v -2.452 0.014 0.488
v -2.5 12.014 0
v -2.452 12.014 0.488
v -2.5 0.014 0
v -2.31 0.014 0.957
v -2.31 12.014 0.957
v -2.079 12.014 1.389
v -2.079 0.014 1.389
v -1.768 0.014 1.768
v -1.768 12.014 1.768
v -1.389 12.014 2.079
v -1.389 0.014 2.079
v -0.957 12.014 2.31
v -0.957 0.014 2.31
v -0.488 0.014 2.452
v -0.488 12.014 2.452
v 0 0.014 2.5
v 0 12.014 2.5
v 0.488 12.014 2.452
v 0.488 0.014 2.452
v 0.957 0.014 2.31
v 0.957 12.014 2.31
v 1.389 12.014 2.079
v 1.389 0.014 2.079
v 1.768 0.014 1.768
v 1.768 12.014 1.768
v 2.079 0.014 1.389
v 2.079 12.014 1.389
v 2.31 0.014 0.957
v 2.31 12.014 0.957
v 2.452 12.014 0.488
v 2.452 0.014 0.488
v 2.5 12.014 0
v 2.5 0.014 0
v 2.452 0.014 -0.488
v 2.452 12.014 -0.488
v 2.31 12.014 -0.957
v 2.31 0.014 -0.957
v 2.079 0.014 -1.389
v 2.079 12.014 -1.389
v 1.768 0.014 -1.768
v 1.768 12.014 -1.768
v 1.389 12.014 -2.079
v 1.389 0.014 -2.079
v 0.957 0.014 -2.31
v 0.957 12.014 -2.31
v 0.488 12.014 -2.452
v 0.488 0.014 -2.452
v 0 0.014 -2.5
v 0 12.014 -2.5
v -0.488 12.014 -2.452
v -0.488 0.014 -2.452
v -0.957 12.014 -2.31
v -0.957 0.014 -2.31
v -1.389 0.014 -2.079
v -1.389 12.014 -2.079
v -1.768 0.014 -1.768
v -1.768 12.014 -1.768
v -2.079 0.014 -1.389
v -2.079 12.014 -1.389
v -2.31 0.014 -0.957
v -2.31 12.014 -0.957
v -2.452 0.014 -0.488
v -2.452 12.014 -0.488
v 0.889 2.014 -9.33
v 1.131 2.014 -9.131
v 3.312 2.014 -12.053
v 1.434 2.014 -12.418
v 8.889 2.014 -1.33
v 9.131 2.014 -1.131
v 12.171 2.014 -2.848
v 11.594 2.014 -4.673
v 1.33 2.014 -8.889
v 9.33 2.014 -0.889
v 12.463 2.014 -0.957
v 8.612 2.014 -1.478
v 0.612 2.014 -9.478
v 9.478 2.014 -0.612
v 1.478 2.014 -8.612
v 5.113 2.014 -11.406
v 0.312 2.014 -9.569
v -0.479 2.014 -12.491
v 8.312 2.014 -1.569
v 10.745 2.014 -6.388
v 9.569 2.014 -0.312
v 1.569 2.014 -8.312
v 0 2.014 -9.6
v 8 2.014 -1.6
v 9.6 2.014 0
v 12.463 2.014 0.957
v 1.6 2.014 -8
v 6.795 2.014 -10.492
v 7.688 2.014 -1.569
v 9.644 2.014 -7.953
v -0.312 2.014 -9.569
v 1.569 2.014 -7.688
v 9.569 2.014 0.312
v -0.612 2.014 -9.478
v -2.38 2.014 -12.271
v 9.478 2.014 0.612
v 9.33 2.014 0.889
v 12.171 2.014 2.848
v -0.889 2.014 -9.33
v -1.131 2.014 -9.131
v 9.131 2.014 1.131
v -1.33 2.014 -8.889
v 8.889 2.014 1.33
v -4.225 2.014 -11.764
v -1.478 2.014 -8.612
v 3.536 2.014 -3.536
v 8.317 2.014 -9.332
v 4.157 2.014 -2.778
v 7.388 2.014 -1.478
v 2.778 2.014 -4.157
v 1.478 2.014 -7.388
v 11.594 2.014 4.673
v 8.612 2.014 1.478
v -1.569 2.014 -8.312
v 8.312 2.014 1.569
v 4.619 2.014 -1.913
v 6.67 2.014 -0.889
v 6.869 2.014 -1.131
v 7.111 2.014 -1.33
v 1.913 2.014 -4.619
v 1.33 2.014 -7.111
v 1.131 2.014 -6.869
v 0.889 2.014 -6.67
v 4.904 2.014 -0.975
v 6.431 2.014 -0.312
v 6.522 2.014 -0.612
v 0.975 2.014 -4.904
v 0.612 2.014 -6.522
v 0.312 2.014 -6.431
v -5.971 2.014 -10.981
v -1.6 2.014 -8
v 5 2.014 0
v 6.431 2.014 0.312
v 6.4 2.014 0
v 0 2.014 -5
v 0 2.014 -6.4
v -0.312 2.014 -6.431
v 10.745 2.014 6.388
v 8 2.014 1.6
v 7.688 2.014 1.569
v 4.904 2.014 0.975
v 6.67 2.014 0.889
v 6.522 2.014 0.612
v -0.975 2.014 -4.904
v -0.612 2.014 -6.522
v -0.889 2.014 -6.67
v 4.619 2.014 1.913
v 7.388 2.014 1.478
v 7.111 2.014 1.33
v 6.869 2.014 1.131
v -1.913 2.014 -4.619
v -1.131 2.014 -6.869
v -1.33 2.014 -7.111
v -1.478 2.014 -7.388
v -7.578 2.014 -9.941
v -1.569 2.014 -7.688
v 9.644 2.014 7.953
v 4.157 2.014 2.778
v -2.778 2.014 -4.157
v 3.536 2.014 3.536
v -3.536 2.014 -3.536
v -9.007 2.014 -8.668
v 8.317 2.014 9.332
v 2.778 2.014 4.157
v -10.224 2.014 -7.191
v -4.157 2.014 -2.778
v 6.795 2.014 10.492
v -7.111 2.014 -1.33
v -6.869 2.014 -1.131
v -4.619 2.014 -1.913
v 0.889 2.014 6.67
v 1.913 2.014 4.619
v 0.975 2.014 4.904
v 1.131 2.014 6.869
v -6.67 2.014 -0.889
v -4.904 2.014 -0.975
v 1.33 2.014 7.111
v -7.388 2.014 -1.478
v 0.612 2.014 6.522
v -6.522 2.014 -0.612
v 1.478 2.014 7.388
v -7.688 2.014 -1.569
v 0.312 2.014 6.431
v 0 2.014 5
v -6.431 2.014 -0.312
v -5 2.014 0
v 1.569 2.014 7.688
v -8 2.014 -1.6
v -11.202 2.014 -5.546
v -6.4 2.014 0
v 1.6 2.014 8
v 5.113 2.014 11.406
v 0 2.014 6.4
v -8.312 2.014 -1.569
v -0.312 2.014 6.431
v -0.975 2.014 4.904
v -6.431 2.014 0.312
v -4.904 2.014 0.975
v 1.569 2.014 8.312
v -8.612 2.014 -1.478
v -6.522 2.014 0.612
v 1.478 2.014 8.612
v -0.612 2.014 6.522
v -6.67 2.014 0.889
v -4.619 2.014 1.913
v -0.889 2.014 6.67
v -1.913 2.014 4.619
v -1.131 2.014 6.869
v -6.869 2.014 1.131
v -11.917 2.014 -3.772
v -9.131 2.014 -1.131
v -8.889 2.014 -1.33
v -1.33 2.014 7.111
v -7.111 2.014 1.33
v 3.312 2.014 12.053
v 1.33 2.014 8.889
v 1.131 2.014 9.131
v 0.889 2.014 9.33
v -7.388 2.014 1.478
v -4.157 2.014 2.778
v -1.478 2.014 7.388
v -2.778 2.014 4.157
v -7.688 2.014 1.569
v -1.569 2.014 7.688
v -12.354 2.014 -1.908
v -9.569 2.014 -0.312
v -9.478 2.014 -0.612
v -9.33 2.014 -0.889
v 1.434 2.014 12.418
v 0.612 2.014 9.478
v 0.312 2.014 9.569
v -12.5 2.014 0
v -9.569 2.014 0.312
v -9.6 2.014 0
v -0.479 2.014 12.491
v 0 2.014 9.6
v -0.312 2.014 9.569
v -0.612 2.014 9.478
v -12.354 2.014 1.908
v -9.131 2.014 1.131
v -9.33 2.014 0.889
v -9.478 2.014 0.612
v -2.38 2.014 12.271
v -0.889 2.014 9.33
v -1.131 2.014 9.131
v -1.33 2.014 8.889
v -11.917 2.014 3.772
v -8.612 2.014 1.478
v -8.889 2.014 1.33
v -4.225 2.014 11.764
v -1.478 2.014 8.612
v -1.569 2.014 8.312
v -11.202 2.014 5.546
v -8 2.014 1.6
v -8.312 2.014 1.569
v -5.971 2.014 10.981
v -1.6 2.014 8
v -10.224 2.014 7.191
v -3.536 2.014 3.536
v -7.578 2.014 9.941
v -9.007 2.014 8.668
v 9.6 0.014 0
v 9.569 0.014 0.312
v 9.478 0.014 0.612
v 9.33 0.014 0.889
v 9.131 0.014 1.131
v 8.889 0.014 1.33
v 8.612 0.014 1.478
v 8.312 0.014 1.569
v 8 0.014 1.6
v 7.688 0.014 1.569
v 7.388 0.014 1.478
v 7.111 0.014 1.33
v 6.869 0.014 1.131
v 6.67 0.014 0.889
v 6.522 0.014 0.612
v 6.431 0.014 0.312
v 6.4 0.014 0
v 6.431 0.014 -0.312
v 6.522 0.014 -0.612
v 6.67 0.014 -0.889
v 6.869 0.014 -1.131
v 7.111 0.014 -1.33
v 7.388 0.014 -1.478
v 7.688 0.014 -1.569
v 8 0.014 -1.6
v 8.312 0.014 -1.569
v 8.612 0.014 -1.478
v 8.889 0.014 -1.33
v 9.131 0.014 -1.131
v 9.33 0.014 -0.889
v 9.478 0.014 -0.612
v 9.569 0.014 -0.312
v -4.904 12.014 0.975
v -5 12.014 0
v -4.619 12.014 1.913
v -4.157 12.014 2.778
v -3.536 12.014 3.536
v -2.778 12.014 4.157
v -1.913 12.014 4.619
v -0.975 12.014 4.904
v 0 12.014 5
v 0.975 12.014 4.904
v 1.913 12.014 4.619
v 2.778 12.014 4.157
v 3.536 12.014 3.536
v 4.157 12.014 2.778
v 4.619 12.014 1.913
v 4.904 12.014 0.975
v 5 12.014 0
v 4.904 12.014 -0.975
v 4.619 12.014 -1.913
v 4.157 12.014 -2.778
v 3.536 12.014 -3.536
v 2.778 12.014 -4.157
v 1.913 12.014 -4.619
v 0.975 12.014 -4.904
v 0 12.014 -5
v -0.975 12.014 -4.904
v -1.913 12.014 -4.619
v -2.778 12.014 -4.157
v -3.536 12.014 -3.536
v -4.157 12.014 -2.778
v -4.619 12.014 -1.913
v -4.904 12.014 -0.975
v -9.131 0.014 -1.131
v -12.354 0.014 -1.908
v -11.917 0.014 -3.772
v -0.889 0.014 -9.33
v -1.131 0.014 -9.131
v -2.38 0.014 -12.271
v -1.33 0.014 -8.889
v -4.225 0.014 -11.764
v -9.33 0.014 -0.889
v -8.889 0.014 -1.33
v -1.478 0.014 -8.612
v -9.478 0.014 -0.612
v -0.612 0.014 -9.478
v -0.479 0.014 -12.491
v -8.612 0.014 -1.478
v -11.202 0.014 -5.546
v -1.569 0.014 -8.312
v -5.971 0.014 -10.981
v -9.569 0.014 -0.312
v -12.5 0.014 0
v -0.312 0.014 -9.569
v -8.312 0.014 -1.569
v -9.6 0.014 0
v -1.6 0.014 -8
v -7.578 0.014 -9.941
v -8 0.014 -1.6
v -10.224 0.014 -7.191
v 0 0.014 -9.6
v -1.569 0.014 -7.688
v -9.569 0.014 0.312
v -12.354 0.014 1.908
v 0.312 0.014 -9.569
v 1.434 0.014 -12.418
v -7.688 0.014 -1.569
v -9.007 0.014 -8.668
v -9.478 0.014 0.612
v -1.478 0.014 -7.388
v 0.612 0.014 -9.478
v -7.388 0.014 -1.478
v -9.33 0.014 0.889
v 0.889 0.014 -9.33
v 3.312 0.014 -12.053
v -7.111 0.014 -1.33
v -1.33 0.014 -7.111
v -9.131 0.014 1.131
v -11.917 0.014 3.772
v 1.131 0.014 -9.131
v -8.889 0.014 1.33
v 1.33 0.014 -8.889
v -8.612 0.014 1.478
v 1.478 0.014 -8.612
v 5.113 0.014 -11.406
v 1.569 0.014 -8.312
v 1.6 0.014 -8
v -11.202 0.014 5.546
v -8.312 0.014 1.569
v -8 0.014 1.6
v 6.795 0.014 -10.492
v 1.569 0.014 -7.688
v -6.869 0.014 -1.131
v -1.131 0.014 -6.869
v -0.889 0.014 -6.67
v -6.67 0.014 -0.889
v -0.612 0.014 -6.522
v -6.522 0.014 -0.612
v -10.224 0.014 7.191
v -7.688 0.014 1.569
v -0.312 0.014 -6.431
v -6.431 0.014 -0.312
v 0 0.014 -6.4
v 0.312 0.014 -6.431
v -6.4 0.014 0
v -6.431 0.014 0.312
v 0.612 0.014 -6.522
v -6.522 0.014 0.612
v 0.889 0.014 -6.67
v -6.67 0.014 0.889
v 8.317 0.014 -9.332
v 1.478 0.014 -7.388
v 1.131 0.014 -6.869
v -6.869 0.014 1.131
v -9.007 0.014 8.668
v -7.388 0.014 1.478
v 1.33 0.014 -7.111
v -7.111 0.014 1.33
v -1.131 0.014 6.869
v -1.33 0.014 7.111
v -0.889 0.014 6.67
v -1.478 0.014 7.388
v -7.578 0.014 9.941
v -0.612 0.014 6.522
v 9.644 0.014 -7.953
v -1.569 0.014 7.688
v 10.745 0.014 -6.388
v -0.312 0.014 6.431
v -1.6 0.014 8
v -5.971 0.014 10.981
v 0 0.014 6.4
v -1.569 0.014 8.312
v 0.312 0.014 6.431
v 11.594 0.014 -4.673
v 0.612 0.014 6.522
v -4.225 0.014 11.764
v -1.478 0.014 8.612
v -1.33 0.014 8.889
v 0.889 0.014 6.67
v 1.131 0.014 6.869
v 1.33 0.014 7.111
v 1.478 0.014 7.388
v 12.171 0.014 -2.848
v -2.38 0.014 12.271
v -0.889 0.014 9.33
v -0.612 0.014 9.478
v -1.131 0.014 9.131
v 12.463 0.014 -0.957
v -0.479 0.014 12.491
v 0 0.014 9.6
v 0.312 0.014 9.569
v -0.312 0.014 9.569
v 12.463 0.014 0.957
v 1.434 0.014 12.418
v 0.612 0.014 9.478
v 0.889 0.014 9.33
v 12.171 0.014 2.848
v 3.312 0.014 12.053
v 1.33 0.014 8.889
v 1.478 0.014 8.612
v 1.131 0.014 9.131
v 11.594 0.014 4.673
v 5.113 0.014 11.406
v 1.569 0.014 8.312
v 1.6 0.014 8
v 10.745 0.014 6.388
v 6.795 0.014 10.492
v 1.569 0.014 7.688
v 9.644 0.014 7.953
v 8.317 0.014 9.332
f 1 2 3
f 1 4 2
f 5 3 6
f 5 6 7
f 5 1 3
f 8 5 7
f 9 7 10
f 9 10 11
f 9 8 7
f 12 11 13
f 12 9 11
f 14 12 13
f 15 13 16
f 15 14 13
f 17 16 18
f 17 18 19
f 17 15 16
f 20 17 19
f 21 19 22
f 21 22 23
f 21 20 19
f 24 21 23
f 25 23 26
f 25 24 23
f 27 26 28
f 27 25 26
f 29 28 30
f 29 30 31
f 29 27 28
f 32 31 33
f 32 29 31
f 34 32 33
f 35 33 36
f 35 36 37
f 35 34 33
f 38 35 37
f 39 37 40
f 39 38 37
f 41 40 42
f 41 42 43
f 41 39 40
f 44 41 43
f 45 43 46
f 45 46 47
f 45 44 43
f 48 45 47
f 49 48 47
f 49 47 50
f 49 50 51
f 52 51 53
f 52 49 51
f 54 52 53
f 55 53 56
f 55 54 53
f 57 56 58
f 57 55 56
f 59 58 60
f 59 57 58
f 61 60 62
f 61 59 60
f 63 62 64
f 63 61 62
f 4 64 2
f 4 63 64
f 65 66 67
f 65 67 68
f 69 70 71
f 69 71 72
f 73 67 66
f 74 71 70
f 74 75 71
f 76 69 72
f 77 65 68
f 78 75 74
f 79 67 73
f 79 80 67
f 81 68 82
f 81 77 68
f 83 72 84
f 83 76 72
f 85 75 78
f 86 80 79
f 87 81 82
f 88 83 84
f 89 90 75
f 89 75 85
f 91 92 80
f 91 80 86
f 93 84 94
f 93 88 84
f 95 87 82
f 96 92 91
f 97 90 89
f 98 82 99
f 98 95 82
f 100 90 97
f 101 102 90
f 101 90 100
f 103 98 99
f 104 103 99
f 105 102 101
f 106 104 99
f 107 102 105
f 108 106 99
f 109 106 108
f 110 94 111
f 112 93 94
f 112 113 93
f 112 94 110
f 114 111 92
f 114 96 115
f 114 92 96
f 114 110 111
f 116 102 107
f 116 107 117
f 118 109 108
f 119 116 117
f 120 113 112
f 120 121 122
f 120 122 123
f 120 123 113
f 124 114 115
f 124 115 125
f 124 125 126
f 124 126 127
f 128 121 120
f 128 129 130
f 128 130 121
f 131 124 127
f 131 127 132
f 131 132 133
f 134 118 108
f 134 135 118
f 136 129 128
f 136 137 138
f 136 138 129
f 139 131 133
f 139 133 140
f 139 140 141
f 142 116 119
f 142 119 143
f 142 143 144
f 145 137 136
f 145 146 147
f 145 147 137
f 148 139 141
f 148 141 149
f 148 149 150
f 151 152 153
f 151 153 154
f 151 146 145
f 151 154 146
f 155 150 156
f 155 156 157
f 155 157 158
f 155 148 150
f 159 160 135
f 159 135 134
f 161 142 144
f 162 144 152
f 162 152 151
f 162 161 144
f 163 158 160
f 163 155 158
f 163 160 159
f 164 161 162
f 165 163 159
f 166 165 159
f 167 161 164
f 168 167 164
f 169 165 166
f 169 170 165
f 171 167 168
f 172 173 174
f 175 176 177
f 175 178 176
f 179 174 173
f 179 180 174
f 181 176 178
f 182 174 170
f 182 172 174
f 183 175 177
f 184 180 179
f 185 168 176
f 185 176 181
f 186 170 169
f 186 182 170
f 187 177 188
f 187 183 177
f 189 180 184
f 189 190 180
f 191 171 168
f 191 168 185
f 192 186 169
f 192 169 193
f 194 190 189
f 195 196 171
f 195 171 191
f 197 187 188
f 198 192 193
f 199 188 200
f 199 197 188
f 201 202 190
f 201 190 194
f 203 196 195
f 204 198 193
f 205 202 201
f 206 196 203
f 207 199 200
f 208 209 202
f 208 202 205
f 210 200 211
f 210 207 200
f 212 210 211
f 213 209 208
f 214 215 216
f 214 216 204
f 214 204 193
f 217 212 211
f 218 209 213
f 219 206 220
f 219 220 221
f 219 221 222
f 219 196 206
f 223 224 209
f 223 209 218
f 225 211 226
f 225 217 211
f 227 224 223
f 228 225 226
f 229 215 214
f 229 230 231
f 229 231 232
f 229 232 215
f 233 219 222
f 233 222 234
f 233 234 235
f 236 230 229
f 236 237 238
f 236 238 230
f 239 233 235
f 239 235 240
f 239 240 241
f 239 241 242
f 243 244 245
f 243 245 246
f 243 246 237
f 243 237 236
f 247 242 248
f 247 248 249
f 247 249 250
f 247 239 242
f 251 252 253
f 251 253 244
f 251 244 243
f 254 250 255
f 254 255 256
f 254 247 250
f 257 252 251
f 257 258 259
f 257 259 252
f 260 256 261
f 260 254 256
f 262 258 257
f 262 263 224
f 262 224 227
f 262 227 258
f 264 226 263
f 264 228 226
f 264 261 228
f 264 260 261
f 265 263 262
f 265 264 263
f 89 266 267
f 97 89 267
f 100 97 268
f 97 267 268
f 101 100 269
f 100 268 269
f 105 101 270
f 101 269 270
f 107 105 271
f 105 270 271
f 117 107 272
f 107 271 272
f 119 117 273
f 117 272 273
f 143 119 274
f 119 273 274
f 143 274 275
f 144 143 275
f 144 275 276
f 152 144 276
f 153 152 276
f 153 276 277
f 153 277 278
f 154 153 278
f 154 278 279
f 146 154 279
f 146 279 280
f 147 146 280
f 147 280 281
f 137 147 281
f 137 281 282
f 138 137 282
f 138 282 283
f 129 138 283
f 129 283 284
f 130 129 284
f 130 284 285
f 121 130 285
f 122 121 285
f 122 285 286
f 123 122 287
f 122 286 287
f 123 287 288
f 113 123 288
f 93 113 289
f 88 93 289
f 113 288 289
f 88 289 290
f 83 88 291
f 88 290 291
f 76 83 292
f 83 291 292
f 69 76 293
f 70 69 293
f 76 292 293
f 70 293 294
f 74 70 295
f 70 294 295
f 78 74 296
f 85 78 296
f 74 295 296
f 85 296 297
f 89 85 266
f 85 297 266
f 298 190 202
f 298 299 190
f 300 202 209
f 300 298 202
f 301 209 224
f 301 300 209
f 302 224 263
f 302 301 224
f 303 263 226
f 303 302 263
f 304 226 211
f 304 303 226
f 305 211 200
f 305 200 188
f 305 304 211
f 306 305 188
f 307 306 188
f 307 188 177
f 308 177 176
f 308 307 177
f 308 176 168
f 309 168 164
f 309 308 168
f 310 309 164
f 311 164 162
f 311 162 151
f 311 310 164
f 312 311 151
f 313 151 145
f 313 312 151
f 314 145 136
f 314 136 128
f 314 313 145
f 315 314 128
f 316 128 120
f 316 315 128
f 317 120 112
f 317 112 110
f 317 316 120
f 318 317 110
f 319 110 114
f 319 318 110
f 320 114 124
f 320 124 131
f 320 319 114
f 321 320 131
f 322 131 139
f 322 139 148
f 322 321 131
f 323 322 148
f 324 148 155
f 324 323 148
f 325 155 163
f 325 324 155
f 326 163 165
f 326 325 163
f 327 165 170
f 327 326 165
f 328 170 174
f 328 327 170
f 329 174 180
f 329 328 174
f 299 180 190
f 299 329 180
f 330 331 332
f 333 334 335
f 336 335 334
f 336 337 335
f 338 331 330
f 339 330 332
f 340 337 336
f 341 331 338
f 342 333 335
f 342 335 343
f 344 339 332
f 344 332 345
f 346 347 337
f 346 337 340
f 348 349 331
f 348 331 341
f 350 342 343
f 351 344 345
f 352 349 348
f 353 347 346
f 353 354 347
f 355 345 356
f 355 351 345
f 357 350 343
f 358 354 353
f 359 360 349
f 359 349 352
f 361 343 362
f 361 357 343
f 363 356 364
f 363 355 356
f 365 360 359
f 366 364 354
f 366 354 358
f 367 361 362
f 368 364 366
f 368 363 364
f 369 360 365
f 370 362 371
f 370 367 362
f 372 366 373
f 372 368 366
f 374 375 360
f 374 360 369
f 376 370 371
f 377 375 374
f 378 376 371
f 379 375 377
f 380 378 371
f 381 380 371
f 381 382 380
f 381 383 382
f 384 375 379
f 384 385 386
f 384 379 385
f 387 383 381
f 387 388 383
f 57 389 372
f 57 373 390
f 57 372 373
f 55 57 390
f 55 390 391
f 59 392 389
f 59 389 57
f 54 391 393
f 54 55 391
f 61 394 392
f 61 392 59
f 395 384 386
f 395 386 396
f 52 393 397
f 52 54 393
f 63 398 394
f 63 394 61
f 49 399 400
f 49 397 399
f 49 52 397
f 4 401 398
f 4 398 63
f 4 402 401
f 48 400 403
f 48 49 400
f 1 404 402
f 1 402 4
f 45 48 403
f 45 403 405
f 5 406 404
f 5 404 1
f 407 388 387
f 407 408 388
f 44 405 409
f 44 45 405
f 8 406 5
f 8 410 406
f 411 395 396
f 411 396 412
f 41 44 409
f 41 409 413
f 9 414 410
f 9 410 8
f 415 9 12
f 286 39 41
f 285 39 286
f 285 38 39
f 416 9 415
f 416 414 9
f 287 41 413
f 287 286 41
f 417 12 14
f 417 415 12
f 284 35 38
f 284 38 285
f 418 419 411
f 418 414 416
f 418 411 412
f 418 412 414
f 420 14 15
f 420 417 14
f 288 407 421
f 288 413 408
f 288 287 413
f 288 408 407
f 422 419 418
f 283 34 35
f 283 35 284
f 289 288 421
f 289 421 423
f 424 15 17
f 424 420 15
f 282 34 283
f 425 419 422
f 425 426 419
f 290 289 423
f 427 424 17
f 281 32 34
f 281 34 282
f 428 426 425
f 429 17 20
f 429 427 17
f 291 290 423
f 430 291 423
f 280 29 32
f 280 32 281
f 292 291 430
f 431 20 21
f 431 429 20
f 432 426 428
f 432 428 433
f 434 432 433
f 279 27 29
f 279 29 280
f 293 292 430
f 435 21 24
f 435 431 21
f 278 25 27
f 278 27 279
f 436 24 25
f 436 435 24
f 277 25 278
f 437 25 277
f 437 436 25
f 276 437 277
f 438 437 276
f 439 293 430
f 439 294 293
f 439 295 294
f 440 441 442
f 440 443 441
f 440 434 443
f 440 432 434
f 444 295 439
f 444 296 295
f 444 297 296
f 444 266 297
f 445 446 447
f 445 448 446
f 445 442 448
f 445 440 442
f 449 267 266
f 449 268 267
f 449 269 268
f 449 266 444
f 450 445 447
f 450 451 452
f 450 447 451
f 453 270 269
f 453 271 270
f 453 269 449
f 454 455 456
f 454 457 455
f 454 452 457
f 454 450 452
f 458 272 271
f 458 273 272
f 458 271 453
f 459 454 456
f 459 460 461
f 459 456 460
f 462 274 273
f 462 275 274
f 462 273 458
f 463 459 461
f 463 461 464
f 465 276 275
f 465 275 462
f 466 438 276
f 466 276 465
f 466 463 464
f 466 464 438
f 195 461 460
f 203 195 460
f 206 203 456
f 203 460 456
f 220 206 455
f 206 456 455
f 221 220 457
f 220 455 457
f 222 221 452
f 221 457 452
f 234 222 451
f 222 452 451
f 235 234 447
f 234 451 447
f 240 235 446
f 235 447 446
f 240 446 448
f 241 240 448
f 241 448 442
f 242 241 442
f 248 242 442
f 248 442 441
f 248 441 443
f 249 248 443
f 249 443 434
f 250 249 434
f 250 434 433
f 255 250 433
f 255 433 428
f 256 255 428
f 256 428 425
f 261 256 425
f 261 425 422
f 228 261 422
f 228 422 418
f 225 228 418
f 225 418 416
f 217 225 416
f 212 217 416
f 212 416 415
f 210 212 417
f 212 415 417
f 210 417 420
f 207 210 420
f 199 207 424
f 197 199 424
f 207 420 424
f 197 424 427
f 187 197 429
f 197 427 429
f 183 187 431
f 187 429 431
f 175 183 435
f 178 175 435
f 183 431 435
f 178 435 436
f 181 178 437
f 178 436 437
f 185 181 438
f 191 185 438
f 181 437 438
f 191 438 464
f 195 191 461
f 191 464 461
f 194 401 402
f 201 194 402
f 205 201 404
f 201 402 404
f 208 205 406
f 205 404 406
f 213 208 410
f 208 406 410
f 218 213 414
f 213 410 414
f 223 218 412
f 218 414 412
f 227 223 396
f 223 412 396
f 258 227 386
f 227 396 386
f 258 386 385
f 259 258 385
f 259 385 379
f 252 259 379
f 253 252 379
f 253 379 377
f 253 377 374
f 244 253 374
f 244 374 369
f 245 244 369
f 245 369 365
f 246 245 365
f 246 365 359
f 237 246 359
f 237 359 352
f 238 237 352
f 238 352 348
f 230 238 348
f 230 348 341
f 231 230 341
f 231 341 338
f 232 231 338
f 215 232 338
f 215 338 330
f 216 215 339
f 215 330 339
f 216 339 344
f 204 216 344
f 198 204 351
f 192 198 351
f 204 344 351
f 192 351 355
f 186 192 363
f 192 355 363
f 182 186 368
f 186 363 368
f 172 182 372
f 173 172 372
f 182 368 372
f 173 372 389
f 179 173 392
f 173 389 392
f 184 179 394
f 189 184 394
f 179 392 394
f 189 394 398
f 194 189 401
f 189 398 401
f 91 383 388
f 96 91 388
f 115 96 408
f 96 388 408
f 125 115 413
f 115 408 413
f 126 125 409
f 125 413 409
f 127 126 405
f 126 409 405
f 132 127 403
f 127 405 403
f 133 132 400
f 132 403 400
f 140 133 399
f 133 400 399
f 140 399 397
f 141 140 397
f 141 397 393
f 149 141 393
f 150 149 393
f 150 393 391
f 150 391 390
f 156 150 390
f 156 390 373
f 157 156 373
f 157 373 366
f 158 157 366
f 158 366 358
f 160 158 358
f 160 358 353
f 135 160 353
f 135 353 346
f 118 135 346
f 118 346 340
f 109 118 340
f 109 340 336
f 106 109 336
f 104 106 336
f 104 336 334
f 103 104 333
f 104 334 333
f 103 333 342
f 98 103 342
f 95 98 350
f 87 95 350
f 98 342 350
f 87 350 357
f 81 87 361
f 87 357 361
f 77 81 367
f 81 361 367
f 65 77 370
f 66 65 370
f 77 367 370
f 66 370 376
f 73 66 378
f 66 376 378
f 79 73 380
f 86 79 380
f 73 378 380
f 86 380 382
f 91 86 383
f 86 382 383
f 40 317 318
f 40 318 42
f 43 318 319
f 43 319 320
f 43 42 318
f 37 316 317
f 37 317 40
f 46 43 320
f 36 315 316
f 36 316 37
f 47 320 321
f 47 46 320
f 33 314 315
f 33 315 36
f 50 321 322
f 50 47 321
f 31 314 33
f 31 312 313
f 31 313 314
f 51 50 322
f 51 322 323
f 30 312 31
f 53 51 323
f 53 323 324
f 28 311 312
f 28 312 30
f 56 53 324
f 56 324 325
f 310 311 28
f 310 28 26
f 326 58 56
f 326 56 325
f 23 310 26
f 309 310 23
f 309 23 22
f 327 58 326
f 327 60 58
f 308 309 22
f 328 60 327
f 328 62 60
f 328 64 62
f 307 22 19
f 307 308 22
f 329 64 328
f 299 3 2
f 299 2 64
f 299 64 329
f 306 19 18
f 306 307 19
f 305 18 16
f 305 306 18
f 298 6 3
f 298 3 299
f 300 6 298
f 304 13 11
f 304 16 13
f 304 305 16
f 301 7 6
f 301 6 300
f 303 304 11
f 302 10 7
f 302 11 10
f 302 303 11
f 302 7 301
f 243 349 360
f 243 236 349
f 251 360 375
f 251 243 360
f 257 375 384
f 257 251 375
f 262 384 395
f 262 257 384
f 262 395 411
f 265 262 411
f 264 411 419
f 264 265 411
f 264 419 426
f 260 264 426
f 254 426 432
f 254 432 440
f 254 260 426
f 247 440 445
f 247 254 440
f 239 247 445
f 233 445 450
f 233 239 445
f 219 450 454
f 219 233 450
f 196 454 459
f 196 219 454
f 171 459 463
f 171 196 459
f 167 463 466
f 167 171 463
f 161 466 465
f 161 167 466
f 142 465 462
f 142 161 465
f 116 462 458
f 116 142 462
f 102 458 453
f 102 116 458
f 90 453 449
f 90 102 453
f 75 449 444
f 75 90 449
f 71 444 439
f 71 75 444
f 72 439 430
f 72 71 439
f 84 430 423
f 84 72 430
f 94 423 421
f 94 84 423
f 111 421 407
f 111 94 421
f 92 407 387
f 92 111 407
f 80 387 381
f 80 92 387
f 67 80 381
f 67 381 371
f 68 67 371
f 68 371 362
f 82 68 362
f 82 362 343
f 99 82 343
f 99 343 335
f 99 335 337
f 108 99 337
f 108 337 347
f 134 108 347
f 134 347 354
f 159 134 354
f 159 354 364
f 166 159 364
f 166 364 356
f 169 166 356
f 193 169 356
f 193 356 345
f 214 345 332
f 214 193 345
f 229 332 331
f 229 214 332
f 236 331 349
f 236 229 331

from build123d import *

# Parameters (mm, degrees)
SKETCH_2_R          = 1.6
CUT_EXTRUDE_1_DEPTH = 10


with BuildPart() as part:
    # 草图1 → 旋转1 (revolve)
    with BuildSketch(Plane.XY):
        Polygon((-2.5, 0.013967073), (-12.5, 0.013967073), (-12.5, 2.013967073), (-5, 2.013967073), (-5, 12.013967073), (-2.5, 12.013967073), align=None)
    revolve(axis=Axis((0, 0, 0), (0, 1, 0)))

    # 草图2 → 切除-拉伸1 (cut)
    with BuildSketch(Plane.XZ.offset(-0.013967073)):
        with Locations((-8, 0)):
            Circle(SKETCH_2_R)
        with Locations((0, 8)):
            Circle(SKETCH_2_R)
        with Locations((8, 0)):
            Circle(SKETCH_2_R)
        with Locations((0, -8)):
            Circle(SKETCH_2_R)
    extrude(amount=-CUT_EXTRUDE_1_DEPTH, mode=Mode.SUBTRACT)


solid = part.part
